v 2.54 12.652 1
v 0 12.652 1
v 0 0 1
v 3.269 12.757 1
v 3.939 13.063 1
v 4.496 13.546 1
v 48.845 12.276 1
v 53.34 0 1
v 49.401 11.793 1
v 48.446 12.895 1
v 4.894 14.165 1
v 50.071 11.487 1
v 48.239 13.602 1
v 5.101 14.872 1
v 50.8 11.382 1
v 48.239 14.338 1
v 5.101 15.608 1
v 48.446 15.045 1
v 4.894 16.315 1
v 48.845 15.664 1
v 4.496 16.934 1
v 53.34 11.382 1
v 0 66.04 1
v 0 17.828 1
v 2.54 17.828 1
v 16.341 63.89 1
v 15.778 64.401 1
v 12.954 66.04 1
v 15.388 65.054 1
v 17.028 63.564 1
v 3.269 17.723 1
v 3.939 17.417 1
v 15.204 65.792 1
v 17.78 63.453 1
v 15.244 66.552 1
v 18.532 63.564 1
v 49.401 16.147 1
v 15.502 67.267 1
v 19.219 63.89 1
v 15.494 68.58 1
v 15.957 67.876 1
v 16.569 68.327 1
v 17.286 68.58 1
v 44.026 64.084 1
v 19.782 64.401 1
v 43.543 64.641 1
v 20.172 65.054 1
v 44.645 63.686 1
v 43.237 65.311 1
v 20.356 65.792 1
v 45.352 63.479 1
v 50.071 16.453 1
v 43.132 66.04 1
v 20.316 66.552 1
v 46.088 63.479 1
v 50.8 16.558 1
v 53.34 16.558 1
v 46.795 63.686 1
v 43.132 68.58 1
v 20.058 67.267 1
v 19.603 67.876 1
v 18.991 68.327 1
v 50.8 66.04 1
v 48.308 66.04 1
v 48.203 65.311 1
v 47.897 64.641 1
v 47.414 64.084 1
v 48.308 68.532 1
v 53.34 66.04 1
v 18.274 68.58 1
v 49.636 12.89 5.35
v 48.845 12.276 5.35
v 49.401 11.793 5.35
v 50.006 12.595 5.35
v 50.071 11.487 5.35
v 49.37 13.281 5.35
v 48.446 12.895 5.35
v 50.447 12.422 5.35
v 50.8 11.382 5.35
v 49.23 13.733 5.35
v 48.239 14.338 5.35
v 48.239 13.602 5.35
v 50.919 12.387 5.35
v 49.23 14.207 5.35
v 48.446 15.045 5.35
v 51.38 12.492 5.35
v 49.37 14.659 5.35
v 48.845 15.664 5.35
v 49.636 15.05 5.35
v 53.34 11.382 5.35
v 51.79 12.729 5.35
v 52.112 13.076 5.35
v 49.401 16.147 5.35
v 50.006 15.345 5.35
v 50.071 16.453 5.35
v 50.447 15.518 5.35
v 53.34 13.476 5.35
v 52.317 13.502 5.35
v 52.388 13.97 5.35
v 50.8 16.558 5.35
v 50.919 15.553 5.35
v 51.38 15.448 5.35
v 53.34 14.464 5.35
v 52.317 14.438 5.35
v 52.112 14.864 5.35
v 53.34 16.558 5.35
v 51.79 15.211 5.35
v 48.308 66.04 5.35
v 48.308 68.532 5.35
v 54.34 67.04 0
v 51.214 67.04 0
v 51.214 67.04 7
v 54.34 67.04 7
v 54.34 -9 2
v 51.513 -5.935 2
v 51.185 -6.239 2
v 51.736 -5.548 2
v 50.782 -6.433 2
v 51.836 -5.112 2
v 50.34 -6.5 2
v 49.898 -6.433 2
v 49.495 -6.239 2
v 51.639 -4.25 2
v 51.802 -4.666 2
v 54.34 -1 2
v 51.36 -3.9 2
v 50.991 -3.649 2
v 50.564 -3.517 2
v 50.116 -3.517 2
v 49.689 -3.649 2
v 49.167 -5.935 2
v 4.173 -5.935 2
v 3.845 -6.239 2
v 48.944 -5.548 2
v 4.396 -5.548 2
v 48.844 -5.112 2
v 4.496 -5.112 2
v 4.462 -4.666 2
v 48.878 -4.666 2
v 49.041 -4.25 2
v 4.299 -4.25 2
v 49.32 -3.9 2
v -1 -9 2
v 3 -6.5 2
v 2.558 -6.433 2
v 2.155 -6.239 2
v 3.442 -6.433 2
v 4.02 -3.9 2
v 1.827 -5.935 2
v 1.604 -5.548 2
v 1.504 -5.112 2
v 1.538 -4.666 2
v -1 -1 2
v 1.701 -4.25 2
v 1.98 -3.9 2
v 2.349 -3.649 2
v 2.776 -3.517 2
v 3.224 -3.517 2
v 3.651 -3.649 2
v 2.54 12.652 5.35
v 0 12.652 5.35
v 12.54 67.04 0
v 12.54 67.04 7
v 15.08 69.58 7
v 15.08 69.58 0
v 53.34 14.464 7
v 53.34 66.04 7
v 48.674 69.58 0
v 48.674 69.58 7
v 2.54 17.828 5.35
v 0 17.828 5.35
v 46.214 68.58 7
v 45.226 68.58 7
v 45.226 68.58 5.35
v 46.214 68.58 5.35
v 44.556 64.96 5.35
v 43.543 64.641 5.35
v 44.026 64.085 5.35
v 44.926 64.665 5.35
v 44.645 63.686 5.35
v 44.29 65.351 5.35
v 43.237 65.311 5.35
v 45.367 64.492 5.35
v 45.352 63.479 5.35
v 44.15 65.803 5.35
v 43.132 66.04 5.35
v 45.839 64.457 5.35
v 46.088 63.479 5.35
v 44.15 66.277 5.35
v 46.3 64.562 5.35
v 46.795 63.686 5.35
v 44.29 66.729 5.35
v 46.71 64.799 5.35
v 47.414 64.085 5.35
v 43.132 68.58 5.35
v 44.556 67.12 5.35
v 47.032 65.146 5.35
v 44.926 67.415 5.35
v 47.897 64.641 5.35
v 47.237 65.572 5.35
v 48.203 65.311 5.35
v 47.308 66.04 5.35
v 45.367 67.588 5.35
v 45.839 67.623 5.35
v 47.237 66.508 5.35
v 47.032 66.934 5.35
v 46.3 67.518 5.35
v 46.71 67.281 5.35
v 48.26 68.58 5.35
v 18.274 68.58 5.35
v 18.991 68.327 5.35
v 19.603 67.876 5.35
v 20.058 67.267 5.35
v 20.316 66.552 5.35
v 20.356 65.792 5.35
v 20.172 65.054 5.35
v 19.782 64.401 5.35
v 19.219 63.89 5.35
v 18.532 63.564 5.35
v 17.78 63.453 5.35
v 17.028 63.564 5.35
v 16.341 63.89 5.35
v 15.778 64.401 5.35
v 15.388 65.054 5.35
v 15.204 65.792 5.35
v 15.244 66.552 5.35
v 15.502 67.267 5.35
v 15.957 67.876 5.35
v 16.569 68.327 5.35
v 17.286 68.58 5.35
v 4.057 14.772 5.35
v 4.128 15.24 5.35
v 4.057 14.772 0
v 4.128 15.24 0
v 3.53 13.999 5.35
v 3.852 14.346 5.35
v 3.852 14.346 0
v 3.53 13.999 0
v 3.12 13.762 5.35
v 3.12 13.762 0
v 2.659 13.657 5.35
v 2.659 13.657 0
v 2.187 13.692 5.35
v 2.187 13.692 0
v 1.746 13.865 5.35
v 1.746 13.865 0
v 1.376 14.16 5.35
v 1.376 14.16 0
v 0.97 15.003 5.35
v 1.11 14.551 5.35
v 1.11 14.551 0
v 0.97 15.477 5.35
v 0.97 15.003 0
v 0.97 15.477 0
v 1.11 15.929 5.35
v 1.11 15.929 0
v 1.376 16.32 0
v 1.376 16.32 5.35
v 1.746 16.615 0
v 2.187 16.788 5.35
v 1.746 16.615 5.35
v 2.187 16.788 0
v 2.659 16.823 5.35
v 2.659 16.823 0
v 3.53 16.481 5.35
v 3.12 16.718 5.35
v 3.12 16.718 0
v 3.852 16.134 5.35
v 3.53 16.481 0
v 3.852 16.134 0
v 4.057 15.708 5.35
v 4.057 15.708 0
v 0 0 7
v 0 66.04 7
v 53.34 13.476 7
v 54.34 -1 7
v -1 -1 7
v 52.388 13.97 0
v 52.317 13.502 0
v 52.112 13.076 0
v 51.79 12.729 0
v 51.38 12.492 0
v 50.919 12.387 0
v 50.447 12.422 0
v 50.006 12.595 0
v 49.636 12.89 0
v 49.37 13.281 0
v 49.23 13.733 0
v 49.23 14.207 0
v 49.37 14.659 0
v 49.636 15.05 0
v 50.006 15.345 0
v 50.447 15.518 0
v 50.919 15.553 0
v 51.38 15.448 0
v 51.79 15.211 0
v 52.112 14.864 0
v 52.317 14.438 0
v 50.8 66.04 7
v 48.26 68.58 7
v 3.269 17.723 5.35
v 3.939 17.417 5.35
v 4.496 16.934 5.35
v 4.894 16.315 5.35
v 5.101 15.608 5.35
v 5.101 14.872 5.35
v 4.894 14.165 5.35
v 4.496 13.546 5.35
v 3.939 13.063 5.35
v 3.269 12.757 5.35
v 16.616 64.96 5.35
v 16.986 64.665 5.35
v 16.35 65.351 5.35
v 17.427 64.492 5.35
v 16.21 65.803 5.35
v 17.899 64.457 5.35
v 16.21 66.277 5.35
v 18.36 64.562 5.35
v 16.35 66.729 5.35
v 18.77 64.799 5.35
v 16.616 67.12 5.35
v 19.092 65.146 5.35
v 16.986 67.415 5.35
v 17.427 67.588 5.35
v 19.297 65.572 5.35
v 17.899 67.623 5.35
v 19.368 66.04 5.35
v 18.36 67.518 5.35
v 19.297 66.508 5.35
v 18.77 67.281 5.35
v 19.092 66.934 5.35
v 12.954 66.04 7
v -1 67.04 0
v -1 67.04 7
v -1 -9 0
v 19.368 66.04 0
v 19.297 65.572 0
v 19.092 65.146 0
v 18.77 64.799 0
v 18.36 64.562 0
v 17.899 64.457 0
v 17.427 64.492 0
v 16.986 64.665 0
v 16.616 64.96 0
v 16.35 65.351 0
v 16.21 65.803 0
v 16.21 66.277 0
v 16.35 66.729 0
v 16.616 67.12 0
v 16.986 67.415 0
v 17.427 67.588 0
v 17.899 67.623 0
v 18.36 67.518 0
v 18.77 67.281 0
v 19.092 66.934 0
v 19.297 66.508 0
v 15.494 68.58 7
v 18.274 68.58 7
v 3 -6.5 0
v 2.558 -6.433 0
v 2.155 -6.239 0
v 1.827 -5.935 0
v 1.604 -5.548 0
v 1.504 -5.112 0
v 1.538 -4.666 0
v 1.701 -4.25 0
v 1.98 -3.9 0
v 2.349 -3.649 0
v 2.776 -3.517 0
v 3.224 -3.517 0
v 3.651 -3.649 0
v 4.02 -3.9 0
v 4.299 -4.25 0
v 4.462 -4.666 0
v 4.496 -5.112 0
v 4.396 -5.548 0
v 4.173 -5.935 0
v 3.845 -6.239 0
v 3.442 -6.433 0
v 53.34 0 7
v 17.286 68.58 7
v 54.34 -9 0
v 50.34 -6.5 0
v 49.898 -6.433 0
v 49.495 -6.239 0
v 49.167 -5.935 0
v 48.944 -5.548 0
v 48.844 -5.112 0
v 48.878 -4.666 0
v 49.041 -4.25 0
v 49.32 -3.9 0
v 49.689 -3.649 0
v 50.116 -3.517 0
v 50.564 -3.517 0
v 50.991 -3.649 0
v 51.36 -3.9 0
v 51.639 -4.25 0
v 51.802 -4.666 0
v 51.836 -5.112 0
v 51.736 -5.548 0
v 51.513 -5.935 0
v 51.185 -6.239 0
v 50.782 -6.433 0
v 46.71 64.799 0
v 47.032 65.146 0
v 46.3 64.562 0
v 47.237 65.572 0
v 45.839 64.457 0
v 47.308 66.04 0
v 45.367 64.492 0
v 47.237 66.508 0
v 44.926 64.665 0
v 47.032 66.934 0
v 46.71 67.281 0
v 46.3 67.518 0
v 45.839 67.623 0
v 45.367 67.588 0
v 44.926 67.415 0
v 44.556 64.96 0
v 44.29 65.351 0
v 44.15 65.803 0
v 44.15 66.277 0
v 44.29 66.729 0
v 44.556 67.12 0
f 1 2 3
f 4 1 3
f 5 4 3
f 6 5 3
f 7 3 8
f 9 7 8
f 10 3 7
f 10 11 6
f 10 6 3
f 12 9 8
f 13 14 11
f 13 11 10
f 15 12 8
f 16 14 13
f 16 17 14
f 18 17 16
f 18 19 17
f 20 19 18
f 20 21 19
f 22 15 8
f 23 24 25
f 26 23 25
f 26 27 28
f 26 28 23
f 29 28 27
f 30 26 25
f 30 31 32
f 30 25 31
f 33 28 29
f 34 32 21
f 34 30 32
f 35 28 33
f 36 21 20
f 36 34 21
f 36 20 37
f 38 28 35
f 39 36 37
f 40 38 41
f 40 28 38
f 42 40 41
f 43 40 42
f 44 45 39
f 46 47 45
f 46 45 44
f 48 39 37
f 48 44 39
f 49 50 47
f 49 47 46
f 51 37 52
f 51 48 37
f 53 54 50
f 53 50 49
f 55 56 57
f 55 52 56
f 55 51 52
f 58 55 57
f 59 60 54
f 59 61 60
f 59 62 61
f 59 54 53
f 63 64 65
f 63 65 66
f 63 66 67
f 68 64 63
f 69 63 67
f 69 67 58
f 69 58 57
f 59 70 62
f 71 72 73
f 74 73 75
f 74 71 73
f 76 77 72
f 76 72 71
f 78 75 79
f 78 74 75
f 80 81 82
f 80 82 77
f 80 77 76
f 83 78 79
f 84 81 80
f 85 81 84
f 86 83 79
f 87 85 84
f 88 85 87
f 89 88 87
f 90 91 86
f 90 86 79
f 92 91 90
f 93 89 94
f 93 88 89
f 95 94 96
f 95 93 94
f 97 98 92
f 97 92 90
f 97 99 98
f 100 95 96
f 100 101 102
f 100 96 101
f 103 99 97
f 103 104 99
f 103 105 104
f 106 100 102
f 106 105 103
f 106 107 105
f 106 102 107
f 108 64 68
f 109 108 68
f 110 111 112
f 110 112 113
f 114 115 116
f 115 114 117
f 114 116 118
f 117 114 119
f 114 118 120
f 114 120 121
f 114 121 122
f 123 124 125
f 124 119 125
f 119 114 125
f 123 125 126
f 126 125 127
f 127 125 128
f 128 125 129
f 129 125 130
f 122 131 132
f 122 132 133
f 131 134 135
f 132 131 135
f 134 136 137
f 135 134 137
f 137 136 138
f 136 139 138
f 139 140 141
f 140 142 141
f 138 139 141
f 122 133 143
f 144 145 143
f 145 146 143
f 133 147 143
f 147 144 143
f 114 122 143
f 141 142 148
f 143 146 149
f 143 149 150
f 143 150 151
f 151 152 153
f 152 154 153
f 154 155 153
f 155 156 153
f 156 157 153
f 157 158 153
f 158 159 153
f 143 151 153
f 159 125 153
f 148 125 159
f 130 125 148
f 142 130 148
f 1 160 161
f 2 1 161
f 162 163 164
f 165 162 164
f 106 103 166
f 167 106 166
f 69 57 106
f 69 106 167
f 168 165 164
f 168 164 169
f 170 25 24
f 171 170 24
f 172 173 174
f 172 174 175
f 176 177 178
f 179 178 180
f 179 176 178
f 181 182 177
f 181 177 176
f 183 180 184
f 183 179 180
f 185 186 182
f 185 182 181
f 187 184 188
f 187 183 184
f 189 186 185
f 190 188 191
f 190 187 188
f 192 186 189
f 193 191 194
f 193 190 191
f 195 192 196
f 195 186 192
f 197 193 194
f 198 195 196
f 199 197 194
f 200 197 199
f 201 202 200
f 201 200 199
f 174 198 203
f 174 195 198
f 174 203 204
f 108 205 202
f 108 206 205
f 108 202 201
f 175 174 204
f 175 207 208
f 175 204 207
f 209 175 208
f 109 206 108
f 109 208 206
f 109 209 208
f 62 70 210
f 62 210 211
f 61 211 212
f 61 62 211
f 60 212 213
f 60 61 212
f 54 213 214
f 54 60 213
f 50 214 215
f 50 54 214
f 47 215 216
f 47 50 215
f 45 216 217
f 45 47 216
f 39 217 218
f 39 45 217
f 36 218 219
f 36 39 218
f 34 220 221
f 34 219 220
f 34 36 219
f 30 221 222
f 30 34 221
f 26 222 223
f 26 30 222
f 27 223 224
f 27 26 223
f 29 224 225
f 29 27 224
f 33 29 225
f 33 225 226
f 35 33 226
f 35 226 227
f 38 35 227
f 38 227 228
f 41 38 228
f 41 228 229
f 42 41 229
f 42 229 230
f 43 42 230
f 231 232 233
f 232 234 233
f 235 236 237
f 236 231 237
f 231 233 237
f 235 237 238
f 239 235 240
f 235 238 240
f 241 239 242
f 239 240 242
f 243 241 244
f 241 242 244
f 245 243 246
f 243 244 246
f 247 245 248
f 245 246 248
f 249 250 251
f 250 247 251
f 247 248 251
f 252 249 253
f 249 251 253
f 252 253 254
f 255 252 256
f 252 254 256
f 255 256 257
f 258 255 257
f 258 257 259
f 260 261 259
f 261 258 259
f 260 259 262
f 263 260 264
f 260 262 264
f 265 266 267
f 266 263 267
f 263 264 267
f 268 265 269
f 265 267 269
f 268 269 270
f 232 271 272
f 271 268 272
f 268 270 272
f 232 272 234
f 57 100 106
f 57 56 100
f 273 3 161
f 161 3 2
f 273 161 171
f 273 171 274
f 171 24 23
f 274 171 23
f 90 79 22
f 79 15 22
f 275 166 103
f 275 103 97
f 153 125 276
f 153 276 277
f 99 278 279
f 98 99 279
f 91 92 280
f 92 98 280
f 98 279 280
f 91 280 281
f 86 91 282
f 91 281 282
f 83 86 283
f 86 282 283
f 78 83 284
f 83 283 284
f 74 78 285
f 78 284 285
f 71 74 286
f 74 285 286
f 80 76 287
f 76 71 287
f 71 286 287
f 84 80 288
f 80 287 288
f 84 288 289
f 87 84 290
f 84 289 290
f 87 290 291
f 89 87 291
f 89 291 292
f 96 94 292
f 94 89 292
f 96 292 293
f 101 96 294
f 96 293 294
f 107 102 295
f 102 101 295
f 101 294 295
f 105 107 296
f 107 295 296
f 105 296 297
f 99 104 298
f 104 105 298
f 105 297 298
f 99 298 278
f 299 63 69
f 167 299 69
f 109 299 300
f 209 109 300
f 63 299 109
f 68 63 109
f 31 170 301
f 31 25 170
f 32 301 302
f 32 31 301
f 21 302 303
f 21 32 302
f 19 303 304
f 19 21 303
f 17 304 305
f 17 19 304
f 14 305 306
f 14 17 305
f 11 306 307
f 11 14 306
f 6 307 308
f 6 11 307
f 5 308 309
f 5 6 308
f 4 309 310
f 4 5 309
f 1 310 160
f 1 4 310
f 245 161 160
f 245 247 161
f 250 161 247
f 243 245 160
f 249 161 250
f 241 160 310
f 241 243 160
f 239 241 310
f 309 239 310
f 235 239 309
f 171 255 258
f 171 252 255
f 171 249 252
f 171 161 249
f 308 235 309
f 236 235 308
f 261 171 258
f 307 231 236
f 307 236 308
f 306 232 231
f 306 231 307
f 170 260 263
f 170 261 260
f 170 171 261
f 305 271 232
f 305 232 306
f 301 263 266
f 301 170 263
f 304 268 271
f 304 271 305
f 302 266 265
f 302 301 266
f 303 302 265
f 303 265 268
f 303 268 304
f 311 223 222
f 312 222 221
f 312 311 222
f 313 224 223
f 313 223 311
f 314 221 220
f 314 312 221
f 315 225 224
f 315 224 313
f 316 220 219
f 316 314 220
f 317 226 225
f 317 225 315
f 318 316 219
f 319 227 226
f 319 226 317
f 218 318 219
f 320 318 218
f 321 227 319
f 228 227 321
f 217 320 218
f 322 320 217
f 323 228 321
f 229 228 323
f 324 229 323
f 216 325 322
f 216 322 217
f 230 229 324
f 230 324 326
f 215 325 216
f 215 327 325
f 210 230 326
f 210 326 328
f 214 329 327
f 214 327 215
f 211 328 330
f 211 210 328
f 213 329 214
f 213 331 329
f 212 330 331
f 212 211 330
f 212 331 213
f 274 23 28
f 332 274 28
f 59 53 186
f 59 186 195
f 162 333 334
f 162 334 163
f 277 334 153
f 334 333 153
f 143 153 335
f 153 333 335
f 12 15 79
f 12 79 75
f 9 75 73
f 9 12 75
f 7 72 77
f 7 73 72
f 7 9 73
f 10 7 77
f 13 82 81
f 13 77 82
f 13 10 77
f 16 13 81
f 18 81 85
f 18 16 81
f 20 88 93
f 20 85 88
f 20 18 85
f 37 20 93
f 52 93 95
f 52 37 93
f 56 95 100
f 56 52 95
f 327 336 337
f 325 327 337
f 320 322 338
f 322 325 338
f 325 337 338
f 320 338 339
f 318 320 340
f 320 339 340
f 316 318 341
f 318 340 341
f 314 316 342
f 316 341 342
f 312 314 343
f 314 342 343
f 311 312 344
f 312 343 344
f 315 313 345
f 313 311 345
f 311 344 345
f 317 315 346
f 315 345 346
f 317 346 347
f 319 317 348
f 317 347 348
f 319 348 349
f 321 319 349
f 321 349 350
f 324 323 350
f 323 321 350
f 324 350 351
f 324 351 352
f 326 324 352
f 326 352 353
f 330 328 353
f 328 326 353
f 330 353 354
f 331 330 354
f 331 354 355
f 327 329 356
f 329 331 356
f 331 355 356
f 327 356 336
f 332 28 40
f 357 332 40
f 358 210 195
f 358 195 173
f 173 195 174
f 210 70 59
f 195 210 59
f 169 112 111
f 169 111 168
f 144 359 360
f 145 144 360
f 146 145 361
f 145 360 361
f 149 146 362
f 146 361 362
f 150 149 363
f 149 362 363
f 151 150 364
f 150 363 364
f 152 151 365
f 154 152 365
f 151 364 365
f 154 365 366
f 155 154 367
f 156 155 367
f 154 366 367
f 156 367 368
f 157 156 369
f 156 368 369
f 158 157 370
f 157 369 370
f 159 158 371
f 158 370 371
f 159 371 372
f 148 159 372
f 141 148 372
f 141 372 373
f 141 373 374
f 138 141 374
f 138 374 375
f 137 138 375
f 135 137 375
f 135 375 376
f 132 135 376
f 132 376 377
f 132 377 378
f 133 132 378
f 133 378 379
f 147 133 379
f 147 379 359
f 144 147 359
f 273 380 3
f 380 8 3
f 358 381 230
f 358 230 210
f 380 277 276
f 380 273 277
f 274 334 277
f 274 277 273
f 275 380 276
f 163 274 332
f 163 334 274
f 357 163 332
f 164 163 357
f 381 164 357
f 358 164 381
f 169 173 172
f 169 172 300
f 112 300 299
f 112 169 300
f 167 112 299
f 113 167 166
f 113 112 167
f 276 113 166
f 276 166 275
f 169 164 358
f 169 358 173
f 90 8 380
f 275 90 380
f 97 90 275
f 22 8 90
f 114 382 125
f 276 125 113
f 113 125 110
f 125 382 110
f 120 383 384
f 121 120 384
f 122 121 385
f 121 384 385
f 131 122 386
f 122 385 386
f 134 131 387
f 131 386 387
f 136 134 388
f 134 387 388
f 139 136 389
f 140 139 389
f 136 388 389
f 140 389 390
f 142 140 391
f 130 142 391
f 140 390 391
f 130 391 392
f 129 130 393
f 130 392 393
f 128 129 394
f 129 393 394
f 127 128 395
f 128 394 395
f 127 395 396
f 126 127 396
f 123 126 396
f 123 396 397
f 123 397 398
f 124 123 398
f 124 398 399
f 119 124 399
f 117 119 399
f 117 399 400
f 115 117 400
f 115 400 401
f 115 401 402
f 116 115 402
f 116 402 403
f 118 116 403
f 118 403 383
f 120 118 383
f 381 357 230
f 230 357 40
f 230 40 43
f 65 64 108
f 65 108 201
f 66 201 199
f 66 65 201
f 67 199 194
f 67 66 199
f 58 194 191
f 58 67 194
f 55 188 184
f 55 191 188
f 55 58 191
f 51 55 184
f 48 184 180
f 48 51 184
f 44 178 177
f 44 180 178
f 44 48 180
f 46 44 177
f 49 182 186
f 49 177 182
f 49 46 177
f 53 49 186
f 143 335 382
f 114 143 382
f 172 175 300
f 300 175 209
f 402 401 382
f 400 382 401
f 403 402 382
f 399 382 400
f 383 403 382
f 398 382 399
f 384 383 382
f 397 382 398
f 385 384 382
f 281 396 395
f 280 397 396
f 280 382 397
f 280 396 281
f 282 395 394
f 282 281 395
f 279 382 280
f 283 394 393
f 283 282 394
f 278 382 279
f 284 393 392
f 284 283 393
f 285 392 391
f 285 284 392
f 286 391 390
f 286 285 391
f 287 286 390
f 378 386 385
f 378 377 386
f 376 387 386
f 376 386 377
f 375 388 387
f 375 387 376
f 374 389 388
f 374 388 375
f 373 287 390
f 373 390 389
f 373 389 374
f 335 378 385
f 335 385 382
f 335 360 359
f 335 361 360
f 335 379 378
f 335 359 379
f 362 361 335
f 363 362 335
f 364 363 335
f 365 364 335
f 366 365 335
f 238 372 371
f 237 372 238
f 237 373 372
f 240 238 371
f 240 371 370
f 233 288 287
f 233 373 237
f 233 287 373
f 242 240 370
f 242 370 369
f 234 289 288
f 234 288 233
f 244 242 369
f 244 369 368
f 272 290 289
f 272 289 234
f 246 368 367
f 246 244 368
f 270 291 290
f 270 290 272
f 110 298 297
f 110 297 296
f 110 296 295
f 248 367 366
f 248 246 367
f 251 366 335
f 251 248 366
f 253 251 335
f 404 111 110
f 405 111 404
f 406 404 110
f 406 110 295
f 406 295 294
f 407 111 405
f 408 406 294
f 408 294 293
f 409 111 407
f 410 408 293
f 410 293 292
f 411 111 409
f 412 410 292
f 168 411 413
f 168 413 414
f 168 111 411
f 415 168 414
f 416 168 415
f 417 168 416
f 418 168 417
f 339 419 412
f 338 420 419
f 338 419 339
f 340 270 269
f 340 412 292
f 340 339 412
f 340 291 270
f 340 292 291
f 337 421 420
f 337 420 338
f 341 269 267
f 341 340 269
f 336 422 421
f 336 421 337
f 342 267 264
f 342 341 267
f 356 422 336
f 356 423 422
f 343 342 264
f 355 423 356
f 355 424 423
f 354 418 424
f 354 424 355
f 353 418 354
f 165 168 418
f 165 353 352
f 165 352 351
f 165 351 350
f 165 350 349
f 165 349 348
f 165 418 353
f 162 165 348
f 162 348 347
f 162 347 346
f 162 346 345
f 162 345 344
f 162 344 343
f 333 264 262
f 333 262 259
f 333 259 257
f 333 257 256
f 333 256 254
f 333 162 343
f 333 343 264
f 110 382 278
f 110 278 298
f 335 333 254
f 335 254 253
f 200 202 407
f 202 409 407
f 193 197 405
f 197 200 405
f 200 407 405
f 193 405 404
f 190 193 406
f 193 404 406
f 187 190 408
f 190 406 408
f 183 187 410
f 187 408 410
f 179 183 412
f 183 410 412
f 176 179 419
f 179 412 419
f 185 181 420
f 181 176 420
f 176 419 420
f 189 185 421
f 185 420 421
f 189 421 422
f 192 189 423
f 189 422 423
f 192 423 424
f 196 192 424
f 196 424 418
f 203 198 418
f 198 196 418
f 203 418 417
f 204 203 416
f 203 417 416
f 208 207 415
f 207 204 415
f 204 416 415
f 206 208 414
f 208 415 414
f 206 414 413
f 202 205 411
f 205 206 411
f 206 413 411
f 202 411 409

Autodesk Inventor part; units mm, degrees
ref_plane "YZ Plane" through (0, 0, 0) normal (1, 0, 0) x (0, 1, 0)
ref_plane "XZ Plane" through (0, 0, 0) normal (0, 1, 0) x (-1, 0, 0)
ref_plane "XY Plane" through (0, 0, 0) normal (0, 0, 1) x (1, 0, 0)
sketch "Esquisse8" plane through (0, 0, 0) normal (0, 0, 1) x (1, 0, 0)
  line L0 (0, 66.04) -> (0, 0)
  line L1 (0, 0) -> (0, 66.04)
  line L2 (12.954, 66.04) -> (0, 66.04)
  line L3 (0, 66.04) -> (12.954, 66.04)
  line L4 (48.26, 68.58) -> (15.494, 68.58)
  line L5 (12.954, 66.04) -> (15.494, 68.58)
  line L6 (50.8, 66.04) -> (48.26, 68.58)
  line L7 (15.494, 68.58) -> (48.26, 68.58)
  line L8 (48.26, 68.58) -> (50.8, 66.04)
  line L9 (53.34, 0) -> (53.34, 66.04)
  line L10 (50.8, 66.04) -> (53.34, 66.04)
  line L11 (53.34, 66.04) -> (53.34, 0)
  line L12 (53.34, 0) -> (0, 0)
  circle A0 centre (2.54, 15.24) radius 1.5875
  circle A1 centre (2.54, 15.24) radius 1.5875
  circle A2 centre (50.8, 13.97) radius 1.5875
  circle A3 centre (50.8, 13.97) radius 1.5875
  circle A4 centre (45.72, 66.04) radius 1.5875
  circle A5 centre (45.72, 66.04) radius 1.5875
  circle A6 centre (17.78, 66.04) radius 1.5875
  circle A7 centre (17.78, 66.04) radius 1.5875
  line L13 (15.0798, 69.58) -> (48.6742, 69.58)
  line L14 (51.2142, 67.04) -> (48.6742, 69.58)
  line L15 (51.2142, 67.04) -> (54.34, 67.04)
  line L16 (54.34, -1) -> (54.34, 67.04)
  line L17 (54.34, -1) -> (-1, -1)
  line L18 (-1, -1) -> (-1, 67.04)
  line L19 (-1, 67.04) -> (12.5398, 67.04)
  line L20 (12.5398, 67.04) -> (15.0798, 69.58)
  dimension "d59" = 1
  dimension "d60" = 1
  dimension "d61" = 1
  dimension "d62" = 1
  dimension "d63" = 1
  dimension "d64" = 1
  dimension "d65" = 1
extrude "Extrusion5" add sketch "Esquisse8" along normal blind 7 contours L2 L5 L4 L6 L10 L9 L12 L0 | L13 L14 L15 L16 L17 L18 L19 L20
shell "Coque1" thickness 1 removed faces 1 at (23.8943, 31.957, 7)
sketch "Esquisse10" plane through (0, 0, 1) normal (0, 0, 1) x (1, 0, 0)
  arc A0 (0, 14.7465) -> (0, 15.7335) centre (2.54, 15.24) ccw projected
  line L0 (2.54, 17.8275) -> (0, 17.8275)
  arc A1 (53.34, 14.4635) -> (53.34, 13.4765) centre (50.8, 13.97) ccw projected
  line L1 (50.8, 16.5575) -> (53.34, 16.5575)
  line L2 (50.8, 11.3825) -> (53.34, 11.3825)
  arc A2 (45.2265, 68.58) -> (46.2135, 68.58) centre (45.72, 66.04) ccw projected
  line L3 (43.1325, 66.04) -> (43.1325, 68.58)
  line L4 (48.3075, 66.04) -> (48.3075, 68.58)
  circle A3 centre (2.54, 15.24) radius 2.5875
  line L5 (0, 17.8275) -> (0, 12.6525)
  line L6 (0, 15.7335) -> (0, 66.04) projected
  line L7 (53.34, 16.5575) -> (53.34, 11.3825)
  line L8 (53.34, 66.04) -> (53.34, 14.4635) projected
  line L9 (43.1325, 68.58) -> (48.3075, 68.58)
  line L10 (18.2735, 68.58) -> (45.2265, 68.58) projected
  circle A4 centre (45.72, 66.04) radius 1.5875 projected
  circle A5 centre (45.72, 66.04) radius 2.5875
  circle A6 centre (50.8, 13.97) radius 1.5875 projected
  circle A7 centre (50.8, 13.97) radius 2.5875
  line L11 (2.54, 12.6525) -> (0, 12.6525)
  line L12 (0, 0) -> (0, 14.7465) projected
extrude "Extrusion6" add sketch "Esquisse10" along normal blind 4.35 contours L5 L0 A0 | L7 A1 | A1 L1 L7 | L7 L2 A1 | L9 A2 | A2 L3 L9 | L9 L4 A2
sketch "Esquisse11" plane through (0, 0, 7) normal (0, 0, 1) x (1, 0, 0)
  arc A0 (0, 14.7465) -> (2.54, 17.8275) centre (2.54, 15.24) ccw projected
  line L0 (2.54, 12.6525) -> (0, 12.6525)
  line L1 (0, 0) -> (0, 14.7465) projected
  line L2 (0, 12.6525) -> (0, 14.7465)
  circle A1 centre (2.54, 15.24) radius 2.5875
extrude "Extrusion7" add sketch "Esquisse11" against normal blind 6 contours A0 L0 L1
sketch "Esquisse12" plane through (0, 0, 0) normal (0, 0, -1) x (-1, 0, 0)
  line L0 (-54.34, -1) -> (1, -1) projected
  line L1 (1, -1) -> (1, -9)
  line L2 (1, -9) -> (-54.34, -9)
  line L3 (-54.34, -9) -> (-54.34, -1)
  point P0 (0, 0)
  dimension "d80" = 8
extrude "Extrusion8" add sketch "Esquisse12" against normal blind 2
sketch "Esquisse13" plane through (0, 0, 2) normal (0, 0, 1) x (1, 0, 0)
  line L0 (-1, -9) -> (54.34, -9) projected
  line L1 (-1, -9) -> (3, -9)
  line L2 (3, -9) -> (3, -1.5792)
  line L3 (-1, -9) -> (-1, 67.04) projected
  line L4 (-1, -9) -> (-1, -5)
  line L5 (-1, -5) -> (3, -5)
  line L6 (26.67, -9) -> (26.67, -6.1659)
  point P0 (0, 0)
  point P1 (50.34, -5)
  dimension "d83" = 4
  dimension "d84" = 4
hole "Perçage2" at (3, -5, 2) at (50.34, -5, 2) direction (0, 0, -1) diameter 3 end through all
sketch "Esquisse14" plane through (0, 0, 7) normal (0, 0, 1) x (1, 0, 0)
  line L0 (0, 0) -> (0, 12.6525) projected
  line L1 (0, 15.7335) -> (0, 17.8275) projected
  line L2 (0, 12.6525) -> (0, 15.7335)
  arc A0 (2.54, 12.6525) -> (0, 15.7335) centre (2.54, 15.24) ccw projected
  line L3 (0, 12.6525) -> (2.54, 12.6525)
  arc A1 (2.54, 12.6525) -> (0, 15.7335) centre (2.54, 15.24) ccw
  circle A2 centre (2.54, 15.24) radius 1.5875
  circle A3 centre (50.8, 13.97) radius 1.5875 projected
  circle A4 centre (50.8, 13.97) radius 1.5875
  arc A5 (53.34, 14.4635) -> (53.34, 13.4765) centre (50.8, 13.97) ccw
  line L4 (53.34, 66.04) -> (53.34, 14.4635) projected
  line L5 (53.34, 14.4635) -> (53.34, 13.4765)
  arc A6 (48.3075, 66.04) -> (46.2135, 68.58) centre (45.72, 66.04) ccw projected
  line L6 (45.2073, 68.58) -> (46.2135, 68.58)
  circle A7 centre (45.72, 66.04) radius 1.5875
  circle A8 centre (45.72, 66.04) radius 1.5875 projected
  arc A9 (45.2265, 68.58) -> (46.2135, 68.58) centre (45.72, 66.04) ccw
  circle A10 centre (17.78, 66.04) radius 1.5875 projected
  circle A11 centre (17.78, 66.04) radius 1.5875
  arc A12 (17.2865, 68.58) -> (18.2735, 68.58) centre (17.78, 66.04) ccw
  arc A13 (17.2865, 68.58) -> (18.2735, 68.58) centre (17.78, 66.04) ccw projected
  line L7 (17.2865, 68.58) -> (18.2735, 68.58)
extrude "Extrusion9" cut sketch "Esquisse14" against normal blind 1.65 contours L2 A0 L3 | L5 A5
sketch "Esquisse15" plane through (0, 0, 7) normal (0, 0, 1) x (1, 0, 0)
  circle A0 centre (17.78, 66.04) radius 1.5875 projected
  circle A1 centre (17.78, 66.04) radius 1.5875
  arc A2 (17.2865, 68.58) -> (18.2735, 68.58) centre (17.78, 66.04) ccw
  line L0 (15.494, 68.58) -> (17.2865, 68.58) projected
  line L1 (17.2865, 68.58) -> (18.2735, 68.58)
  circle A3 centre (45.72, 66.04) radius 1.5875 projected
  circle A4 centre (45.72, 66.04) radius 1.5875
  arc A5 (45.2265, 68.58) -> (46.2135, 68.58) centre (45.72, 66.04) ccw
  line L2 (18.2735, 68.58) -> (45.2265, 68.58) projected
  arc A6 (45.2265, 68.58) -> (46.2135, 68.58) centre (45.72, 66.04) ccw projected
  line L3 (45.2265, 68.58) -> (46.2135, 68.58)
  point P0 (0, 0)
extrude "Extrusion10" cut sketch "Esquisse15" against normal blind 1.65
properties part number "Arduino+Support"
